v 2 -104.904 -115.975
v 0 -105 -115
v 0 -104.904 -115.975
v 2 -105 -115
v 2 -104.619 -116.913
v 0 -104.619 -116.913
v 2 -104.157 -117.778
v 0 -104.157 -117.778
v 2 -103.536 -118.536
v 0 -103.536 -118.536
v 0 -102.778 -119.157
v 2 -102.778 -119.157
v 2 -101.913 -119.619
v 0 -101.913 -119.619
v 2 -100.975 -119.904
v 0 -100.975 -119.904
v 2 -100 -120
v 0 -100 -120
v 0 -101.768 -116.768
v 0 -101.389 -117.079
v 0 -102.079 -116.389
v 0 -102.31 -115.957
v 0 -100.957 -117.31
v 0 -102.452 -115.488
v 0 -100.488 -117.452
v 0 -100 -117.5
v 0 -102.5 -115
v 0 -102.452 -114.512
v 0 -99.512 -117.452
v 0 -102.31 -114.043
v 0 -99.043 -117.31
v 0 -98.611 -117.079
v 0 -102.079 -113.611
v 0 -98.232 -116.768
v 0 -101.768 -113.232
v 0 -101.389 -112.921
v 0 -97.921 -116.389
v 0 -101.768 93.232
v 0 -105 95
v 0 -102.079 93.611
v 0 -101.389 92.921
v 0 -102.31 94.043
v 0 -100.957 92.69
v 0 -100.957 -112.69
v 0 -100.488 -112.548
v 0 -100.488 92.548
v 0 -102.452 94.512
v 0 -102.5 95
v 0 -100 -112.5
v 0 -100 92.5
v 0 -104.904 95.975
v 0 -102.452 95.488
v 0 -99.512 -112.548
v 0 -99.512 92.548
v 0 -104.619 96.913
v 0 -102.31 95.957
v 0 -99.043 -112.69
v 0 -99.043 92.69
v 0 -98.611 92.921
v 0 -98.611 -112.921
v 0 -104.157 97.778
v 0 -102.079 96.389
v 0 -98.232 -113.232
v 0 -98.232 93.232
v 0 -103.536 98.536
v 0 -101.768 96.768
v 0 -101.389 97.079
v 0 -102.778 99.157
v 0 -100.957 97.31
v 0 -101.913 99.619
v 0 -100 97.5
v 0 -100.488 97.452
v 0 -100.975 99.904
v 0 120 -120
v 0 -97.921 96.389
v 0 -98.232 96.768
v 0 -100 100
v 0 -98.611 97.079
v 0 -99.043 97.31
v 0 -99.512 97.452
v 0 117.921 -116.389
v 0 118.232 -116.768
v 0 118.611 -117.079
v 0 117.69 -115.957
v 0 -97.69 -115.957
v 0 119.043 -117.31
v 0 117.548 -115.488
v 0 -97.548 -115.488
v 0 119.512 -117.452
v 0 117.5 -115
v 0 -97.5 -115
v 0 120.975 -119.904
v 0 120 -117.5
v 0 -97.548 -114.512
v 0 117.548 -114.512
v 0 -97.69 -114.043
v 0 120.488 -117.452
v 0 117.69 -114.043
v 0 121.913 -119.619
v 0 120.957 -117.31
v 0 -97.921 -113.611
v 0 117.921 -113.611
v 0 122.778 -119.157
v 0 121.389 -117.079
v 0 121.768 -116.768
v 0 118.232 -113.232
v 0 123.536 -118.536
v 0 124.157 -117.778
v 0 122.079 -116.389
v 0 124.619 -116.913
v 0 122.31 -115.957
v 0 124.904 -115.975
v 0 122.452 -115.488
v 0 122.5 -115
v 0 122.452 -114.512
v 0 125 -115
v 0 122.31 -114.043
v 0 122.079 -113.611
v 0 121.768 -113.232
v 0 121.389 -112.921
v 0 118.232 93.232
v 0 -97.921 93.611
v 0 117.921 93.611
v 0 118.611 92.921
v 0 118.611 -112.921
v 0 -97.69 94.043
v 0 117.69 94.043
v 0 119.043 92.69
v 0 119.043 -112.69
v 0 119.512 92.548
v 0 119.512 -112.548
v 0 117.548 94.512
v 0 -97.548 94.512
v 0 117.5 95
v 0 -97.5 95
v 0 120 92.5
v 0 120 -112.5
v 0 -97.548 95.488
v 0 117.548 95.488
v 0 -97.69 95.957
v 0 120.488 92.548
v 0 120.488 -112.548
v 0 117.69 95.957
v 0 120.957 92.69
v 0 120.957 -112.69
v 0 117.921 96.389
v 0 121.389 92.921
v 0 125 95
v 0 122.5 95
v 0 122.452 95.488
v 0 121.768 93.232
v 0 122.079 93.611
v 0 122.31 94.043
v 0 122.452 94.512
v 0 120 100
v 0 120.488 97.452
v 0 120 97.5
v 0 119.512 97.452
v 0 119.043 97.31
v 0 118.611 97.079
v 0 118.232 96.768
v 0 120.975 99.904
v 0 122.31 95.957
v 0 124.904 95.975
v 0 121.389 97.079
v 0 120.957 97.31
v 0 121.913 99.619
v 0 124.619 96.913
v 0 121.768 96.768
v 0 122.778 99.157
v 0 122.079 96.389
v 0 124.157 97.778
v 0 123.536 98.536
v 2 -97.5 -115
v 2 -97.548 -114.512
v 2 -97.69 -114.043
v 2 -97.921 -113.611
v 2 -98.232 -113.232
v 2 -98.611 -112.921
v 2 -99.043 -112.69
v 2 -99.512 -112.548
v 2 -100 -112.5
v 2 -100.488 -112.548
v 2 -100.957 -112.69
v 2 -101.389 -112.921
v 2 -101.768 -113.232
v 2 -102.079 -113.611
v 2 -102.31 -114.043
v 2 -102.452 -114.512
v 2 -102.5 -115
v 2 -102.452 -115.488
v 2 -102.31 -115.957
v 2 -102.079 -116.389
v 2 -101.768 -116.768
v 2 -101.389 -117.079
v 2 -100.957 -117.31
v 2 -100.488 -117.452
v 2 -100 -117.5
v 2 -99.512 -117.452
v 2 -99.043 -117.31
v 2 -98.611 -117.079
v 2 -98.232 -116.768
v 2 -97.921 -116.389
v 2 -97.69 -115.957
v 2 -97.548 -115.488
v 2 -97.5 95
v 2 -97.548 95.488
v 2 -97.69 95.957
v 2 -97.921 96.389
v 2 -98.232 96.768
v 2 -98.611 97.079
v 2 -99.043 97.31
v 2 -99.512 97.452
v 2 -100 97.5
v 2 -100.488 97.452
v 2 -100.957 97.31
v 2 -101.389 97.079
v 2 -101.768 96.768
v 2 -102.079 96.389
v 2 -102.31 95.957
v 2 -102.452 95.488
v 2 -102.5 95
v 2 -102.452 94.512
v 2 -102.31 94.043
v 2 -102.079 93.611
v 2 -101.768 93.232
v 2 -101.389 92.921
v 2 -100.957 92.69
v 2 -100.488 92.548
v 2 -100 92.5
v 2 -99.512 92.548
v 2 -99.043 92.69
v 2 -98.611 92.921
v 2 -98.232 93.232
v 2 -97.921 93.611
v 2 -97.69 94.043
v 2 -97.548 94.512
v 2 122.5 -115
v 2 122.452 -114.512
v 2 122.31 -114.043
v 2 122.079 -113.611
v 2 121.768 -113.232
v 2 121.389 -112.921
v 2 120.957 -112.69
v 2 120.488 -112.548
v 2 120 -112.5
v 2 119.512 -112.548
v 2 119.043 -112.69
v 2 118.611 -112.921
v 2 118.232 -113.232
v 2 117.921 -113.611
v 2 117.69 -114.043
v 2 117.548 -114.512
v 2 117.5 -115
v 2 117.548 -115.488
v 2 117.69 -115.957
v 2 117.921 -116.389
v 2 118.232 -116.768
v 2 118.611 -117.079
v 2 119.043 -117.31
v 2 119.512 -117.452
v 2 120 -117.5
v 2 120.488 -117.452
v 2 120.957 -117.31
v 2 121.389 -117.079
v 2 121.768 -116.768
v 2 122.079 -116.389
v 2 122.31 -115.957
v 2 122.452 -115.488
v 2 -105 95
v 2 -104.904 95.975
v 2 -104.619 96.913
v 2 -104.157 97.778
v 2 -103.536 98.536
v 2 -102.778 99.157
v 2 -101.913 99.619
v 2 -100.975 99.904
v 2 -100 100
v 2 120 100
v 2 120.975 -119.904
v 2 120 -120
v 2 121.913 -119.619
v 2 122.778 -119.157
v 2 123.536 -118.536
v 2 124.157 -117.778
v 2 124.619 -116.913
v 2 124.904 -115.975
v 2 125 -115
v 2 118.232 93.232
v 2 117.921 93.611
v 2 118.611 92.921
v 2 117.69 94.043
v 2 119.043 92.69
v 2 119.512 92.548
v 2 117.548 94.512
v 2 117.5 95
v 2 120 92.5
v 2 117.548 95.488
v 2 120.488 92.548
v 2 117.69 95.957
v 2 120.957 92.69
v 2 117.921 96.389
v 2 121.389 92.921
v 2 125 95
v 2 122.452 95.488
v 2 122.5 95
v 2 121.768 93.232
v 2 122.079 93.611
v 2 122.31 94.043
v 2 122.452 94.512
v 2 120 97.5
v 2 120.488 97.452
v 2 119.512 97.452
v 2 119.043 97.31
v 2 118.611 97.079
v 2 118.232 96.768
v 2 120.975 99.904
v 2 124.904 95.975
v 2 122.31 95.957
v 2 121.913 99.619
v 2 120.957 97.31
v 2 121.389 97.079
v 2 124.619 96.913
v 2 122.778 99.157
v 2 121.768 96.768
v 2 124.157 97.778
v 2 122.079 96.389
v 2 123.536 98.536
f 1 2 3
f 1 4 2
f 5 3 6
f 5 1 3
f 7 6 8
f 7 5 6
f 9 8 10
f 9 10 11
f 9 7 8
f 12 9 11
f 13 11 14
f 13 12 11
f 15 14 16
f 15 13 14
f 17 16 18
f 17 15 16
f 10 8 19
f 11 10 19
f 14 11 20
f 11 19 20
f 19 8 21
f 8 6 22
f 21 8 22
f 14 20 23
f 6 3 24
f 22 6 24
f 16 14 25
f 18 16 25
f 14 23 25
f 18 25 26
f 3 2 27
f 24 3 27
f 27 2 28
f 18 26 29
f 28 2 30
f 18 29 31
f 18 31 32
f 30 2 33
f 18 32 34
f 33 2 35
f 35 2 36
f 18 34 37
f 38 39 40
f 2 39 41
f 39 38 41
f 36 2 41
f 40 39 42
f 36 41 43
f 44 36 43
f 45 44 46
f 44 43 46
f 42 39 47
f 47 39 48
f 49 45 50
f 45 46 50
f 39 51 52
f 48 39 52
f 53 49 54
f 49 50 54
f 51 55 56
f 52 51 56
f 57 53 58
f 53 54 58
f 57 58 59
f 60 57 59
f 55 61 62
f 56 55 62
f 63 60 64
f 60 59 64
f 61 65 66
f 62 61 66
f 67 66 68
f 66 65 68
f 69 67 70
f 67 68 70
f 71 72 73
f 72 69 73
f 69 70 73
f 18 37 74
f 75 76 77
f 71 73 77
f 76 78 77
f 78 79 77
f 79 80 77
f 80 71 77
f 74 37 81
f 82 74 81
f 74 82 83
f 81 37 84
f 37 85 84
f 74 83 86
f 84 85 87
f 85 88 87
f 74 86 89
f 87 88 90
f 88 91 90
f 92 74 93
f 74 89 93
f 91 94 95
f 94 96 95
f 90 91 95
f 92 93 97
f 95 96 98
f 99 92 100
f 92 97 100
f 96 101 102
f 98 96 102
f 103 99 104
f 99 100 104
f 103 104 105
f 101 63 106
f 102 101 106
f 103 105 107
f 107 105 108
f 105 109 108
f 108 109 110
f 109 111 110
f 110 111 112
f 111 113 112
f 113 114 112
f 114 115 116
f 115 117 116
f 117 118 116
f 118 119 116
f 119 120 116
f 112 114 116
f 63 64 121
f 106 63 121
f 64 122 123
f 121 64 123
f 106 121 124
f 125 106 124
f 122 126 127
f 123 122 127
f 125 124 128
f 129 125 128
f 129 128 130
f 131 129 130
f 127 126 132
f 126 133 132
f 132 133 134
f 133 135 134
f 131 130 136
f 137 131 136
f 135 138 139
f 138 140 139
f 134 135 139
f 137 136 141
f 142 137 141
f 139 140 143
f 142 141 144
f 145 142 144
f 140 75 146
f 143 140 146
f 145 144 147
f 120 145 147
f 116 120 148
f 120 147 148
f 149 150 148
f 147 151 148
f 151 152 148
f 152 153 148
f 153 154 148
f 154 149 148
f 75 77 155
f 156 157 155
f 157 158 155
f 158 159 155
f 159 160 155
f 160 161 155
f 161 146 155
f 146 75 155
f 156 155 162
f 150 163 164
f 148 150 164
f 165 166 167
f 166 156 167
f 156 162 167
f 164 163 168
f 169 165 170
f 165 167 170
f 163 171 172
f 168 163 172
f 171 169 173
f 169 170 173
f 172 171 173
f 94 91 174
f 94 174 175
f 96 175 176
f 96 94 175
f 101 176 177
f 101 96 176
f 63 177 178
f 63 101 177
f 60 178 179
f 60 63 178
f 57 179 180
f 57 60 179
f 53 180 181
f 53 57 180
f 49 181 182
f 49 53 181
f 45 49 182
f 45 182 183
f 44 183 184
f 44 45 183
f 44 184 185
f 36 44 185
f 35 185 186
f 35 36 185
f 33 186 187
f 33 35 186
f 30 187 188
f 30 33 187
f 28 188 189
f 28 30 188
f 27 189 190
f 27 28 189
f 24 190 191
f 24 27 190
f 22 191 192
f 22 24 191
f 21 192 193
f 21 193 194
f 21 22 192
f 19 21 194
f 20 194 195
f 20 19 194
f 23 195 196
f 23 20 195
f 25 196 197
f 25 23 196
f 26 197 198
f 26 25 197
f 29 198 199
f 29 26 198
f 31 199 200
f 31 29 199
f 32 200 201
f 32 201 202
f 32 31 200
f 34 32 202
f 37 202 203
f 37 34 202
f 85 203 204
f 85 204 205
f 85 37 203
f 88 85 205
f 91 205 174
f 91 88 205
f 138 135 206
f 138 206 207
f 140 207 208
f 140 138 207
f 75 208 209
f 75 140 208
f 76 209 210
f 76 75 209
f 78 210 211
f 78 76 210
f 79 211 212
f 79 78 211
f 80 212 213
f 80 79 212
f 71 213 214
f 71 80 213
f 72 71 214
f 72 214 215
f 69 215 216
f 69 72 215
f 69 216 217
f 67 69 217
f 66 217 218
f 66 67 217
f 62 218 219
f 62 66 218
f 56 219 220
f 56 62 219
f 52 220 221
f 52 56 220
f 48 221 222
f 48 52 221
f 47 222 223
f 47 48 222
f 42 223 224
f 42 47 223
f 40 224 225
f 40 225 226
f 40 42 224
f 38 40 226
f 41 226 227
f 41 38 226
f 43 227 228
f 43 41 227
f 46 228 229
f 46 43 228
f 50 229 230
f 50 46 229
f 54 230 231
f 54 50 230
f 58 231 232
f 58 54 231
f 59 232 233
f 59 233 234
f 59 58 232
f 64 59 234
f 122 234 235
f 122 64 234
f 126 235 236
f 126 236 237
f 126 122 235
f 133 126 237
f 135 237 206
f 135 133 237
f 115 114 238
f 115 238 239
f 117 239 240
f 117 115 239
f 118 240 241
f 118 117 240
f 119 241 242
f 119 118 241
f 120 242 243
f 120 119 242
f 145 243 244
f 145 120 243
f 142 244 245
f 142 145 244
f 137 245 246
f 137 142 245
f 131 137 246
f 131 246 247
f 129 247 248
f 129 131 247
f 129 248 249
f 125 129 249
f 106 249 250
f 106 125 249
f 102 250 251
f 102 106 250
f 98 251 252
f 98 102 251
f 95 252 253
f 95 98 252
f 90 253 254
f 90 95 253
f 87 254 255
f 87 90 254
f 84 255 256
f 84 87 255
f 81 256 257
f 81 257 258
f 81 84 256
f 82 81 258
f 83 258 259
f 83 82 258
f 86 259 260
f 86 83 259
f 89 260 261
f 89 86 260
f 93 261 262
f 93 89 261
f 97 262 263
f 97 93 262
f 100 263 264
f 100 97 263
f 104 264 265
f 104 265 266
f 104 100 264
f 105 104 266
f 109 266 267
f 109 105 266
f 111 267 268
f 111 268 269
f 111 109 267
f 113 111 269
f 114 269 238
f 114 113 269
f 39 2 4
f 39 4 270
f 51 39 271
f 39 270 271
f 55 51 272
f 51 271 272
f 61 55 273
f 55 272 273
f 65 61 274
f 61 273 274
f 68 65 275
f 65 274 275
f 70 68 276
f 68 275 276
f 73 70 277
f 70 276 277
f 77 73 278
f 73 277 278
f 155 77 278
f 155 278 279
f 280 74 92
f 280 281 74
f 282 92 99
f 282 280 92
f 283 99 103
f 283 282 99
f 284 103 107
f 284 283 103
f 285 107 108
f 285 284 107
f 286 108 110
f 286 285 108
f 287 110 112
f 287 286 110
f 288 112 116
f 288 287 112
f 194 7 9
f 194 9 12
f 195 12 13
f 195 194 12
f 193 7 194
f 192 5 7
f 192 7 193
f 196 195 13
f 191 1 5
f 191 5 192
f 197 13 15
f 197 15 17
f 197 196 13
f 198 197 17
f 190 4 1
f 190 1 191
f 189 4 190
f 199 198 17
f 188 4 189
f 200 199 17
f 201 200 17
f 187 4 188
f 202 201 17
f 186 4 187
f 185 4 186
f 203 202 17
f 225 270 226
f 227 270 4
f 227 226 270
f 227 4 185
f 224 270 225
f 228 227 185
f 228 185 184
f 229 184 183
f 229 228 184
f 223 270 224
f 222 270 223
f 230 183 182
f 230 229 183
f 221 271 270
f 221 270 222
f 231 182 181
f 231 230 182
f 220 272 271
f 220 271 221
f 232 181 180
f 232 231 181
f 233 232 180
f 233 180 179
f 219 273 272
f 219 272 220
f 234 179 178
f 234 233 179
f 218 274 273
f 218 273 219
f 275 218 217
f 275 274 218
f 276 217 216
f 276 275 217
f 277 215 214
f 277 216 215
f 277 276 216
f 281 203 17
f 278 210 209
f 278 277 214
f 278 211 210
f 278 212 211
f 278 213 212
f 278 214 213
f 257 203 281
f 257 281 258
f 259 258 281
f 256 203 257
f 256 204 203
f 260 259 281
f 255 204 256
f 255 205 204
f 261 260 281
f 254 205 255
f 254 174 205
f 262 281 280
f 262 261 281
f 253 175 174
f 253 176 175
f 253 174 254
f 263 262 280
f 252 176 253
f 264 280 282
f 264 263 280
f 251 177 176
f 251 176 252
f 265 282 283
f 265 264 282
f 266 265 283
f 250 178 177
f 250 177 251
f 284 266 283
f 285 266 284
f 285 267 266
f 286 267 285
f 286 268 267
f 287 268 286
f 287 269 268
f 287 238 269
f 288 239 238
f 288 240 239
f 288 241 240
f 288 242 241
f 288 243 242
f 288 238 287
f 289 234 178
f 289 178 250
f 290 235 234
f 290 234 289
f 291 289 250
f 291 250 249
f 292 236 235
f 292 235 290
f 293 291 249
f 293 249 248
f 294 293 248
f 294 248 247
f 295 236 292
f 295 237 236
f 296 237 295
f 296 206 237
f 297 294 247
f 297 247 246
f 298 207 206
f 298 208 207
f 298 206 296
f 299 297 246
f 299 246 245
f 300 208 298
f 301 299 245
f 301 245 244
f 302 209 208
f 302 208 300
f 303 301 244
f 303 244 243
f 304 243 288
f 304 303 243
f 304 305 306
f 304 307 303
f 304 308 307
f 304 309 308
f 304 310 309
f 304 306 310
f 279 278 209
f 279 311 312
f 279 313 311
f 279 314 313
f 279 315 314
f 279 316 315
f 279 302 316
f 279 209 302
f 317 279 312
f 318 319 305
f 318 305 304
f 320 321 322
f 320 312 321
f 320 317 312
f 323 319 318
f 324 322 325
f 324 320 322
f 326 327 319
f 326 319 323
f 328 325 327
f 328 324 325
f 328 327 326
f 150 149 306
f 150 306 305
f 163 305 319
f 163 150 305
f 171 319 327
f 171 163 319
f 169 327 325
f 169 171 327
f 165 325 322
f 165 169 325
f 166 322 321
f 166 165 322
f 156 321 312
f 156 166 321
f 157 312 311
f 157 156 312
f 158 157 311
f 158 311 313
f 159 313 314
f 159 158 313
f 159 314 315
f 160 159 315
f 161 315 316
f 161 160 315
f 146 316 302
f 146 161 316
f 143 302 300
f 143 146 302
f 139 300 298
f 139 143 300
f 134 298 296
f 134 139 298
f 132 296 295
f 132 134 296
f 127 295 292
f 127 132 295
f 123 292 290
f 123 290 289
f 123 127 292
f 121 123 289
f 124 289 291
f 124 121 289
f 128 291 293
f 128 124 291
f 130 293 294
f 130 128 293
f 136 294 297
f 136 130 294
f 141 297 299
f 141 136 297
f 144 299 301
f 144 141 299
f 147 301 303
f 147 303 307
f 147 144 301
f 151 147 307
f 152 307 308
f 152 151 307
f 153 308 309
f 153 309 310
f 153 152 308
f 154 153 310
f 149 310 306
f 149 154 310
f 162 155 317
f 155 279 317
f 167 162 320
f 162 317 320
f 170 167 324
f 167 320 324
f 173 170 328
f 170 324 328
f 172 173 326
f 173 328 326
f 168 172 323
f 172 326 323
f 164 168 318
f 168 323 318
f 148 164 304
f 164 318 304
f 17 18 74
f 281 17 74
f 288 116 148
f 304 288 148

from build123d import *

# Parameters (mm, degrees)
SKETCH_W  = 230
SKETCH_H  = 220
SKETCH_R  = 2.5
PAD_DEPTH = 2
FILLET_R  = 5


with BuildPart() as part:
    # Sketch → Pad (new body)
    with BuildSketch(Plane.YZ):
        with Locations((10, -10)):
            Rectangle(SKETCH_W, SKETCH_H)
        with Locations((-100, 95)):
            Circle(SKETCH_R, mode=Mode.SUBTRACT)
        with Locations((120, 95)):
            Circle(SKETCH_R, mode=Mode.SUBTRACT)
        with Locations((-100, -115)):
            Circle(SKETCH_R, mode=Mode.SUBTRACT)
        with Locations((120, -115)):
            Circle(SKETCH_R, mode=Mode.SUBTRACT)
    extrude(amount=PAD_DEPTH)

    # Fillet
    fillet_edges = [part.edges().sort_by_distance(p)[0] for p in [
        (1, 125, -120),
        (1, -105, -120),
        (1, -105, 100),
        (1, 125, 100),
    ]]
    fillet(fillet_edges, radius=FILLET_R)


solid = part.part
